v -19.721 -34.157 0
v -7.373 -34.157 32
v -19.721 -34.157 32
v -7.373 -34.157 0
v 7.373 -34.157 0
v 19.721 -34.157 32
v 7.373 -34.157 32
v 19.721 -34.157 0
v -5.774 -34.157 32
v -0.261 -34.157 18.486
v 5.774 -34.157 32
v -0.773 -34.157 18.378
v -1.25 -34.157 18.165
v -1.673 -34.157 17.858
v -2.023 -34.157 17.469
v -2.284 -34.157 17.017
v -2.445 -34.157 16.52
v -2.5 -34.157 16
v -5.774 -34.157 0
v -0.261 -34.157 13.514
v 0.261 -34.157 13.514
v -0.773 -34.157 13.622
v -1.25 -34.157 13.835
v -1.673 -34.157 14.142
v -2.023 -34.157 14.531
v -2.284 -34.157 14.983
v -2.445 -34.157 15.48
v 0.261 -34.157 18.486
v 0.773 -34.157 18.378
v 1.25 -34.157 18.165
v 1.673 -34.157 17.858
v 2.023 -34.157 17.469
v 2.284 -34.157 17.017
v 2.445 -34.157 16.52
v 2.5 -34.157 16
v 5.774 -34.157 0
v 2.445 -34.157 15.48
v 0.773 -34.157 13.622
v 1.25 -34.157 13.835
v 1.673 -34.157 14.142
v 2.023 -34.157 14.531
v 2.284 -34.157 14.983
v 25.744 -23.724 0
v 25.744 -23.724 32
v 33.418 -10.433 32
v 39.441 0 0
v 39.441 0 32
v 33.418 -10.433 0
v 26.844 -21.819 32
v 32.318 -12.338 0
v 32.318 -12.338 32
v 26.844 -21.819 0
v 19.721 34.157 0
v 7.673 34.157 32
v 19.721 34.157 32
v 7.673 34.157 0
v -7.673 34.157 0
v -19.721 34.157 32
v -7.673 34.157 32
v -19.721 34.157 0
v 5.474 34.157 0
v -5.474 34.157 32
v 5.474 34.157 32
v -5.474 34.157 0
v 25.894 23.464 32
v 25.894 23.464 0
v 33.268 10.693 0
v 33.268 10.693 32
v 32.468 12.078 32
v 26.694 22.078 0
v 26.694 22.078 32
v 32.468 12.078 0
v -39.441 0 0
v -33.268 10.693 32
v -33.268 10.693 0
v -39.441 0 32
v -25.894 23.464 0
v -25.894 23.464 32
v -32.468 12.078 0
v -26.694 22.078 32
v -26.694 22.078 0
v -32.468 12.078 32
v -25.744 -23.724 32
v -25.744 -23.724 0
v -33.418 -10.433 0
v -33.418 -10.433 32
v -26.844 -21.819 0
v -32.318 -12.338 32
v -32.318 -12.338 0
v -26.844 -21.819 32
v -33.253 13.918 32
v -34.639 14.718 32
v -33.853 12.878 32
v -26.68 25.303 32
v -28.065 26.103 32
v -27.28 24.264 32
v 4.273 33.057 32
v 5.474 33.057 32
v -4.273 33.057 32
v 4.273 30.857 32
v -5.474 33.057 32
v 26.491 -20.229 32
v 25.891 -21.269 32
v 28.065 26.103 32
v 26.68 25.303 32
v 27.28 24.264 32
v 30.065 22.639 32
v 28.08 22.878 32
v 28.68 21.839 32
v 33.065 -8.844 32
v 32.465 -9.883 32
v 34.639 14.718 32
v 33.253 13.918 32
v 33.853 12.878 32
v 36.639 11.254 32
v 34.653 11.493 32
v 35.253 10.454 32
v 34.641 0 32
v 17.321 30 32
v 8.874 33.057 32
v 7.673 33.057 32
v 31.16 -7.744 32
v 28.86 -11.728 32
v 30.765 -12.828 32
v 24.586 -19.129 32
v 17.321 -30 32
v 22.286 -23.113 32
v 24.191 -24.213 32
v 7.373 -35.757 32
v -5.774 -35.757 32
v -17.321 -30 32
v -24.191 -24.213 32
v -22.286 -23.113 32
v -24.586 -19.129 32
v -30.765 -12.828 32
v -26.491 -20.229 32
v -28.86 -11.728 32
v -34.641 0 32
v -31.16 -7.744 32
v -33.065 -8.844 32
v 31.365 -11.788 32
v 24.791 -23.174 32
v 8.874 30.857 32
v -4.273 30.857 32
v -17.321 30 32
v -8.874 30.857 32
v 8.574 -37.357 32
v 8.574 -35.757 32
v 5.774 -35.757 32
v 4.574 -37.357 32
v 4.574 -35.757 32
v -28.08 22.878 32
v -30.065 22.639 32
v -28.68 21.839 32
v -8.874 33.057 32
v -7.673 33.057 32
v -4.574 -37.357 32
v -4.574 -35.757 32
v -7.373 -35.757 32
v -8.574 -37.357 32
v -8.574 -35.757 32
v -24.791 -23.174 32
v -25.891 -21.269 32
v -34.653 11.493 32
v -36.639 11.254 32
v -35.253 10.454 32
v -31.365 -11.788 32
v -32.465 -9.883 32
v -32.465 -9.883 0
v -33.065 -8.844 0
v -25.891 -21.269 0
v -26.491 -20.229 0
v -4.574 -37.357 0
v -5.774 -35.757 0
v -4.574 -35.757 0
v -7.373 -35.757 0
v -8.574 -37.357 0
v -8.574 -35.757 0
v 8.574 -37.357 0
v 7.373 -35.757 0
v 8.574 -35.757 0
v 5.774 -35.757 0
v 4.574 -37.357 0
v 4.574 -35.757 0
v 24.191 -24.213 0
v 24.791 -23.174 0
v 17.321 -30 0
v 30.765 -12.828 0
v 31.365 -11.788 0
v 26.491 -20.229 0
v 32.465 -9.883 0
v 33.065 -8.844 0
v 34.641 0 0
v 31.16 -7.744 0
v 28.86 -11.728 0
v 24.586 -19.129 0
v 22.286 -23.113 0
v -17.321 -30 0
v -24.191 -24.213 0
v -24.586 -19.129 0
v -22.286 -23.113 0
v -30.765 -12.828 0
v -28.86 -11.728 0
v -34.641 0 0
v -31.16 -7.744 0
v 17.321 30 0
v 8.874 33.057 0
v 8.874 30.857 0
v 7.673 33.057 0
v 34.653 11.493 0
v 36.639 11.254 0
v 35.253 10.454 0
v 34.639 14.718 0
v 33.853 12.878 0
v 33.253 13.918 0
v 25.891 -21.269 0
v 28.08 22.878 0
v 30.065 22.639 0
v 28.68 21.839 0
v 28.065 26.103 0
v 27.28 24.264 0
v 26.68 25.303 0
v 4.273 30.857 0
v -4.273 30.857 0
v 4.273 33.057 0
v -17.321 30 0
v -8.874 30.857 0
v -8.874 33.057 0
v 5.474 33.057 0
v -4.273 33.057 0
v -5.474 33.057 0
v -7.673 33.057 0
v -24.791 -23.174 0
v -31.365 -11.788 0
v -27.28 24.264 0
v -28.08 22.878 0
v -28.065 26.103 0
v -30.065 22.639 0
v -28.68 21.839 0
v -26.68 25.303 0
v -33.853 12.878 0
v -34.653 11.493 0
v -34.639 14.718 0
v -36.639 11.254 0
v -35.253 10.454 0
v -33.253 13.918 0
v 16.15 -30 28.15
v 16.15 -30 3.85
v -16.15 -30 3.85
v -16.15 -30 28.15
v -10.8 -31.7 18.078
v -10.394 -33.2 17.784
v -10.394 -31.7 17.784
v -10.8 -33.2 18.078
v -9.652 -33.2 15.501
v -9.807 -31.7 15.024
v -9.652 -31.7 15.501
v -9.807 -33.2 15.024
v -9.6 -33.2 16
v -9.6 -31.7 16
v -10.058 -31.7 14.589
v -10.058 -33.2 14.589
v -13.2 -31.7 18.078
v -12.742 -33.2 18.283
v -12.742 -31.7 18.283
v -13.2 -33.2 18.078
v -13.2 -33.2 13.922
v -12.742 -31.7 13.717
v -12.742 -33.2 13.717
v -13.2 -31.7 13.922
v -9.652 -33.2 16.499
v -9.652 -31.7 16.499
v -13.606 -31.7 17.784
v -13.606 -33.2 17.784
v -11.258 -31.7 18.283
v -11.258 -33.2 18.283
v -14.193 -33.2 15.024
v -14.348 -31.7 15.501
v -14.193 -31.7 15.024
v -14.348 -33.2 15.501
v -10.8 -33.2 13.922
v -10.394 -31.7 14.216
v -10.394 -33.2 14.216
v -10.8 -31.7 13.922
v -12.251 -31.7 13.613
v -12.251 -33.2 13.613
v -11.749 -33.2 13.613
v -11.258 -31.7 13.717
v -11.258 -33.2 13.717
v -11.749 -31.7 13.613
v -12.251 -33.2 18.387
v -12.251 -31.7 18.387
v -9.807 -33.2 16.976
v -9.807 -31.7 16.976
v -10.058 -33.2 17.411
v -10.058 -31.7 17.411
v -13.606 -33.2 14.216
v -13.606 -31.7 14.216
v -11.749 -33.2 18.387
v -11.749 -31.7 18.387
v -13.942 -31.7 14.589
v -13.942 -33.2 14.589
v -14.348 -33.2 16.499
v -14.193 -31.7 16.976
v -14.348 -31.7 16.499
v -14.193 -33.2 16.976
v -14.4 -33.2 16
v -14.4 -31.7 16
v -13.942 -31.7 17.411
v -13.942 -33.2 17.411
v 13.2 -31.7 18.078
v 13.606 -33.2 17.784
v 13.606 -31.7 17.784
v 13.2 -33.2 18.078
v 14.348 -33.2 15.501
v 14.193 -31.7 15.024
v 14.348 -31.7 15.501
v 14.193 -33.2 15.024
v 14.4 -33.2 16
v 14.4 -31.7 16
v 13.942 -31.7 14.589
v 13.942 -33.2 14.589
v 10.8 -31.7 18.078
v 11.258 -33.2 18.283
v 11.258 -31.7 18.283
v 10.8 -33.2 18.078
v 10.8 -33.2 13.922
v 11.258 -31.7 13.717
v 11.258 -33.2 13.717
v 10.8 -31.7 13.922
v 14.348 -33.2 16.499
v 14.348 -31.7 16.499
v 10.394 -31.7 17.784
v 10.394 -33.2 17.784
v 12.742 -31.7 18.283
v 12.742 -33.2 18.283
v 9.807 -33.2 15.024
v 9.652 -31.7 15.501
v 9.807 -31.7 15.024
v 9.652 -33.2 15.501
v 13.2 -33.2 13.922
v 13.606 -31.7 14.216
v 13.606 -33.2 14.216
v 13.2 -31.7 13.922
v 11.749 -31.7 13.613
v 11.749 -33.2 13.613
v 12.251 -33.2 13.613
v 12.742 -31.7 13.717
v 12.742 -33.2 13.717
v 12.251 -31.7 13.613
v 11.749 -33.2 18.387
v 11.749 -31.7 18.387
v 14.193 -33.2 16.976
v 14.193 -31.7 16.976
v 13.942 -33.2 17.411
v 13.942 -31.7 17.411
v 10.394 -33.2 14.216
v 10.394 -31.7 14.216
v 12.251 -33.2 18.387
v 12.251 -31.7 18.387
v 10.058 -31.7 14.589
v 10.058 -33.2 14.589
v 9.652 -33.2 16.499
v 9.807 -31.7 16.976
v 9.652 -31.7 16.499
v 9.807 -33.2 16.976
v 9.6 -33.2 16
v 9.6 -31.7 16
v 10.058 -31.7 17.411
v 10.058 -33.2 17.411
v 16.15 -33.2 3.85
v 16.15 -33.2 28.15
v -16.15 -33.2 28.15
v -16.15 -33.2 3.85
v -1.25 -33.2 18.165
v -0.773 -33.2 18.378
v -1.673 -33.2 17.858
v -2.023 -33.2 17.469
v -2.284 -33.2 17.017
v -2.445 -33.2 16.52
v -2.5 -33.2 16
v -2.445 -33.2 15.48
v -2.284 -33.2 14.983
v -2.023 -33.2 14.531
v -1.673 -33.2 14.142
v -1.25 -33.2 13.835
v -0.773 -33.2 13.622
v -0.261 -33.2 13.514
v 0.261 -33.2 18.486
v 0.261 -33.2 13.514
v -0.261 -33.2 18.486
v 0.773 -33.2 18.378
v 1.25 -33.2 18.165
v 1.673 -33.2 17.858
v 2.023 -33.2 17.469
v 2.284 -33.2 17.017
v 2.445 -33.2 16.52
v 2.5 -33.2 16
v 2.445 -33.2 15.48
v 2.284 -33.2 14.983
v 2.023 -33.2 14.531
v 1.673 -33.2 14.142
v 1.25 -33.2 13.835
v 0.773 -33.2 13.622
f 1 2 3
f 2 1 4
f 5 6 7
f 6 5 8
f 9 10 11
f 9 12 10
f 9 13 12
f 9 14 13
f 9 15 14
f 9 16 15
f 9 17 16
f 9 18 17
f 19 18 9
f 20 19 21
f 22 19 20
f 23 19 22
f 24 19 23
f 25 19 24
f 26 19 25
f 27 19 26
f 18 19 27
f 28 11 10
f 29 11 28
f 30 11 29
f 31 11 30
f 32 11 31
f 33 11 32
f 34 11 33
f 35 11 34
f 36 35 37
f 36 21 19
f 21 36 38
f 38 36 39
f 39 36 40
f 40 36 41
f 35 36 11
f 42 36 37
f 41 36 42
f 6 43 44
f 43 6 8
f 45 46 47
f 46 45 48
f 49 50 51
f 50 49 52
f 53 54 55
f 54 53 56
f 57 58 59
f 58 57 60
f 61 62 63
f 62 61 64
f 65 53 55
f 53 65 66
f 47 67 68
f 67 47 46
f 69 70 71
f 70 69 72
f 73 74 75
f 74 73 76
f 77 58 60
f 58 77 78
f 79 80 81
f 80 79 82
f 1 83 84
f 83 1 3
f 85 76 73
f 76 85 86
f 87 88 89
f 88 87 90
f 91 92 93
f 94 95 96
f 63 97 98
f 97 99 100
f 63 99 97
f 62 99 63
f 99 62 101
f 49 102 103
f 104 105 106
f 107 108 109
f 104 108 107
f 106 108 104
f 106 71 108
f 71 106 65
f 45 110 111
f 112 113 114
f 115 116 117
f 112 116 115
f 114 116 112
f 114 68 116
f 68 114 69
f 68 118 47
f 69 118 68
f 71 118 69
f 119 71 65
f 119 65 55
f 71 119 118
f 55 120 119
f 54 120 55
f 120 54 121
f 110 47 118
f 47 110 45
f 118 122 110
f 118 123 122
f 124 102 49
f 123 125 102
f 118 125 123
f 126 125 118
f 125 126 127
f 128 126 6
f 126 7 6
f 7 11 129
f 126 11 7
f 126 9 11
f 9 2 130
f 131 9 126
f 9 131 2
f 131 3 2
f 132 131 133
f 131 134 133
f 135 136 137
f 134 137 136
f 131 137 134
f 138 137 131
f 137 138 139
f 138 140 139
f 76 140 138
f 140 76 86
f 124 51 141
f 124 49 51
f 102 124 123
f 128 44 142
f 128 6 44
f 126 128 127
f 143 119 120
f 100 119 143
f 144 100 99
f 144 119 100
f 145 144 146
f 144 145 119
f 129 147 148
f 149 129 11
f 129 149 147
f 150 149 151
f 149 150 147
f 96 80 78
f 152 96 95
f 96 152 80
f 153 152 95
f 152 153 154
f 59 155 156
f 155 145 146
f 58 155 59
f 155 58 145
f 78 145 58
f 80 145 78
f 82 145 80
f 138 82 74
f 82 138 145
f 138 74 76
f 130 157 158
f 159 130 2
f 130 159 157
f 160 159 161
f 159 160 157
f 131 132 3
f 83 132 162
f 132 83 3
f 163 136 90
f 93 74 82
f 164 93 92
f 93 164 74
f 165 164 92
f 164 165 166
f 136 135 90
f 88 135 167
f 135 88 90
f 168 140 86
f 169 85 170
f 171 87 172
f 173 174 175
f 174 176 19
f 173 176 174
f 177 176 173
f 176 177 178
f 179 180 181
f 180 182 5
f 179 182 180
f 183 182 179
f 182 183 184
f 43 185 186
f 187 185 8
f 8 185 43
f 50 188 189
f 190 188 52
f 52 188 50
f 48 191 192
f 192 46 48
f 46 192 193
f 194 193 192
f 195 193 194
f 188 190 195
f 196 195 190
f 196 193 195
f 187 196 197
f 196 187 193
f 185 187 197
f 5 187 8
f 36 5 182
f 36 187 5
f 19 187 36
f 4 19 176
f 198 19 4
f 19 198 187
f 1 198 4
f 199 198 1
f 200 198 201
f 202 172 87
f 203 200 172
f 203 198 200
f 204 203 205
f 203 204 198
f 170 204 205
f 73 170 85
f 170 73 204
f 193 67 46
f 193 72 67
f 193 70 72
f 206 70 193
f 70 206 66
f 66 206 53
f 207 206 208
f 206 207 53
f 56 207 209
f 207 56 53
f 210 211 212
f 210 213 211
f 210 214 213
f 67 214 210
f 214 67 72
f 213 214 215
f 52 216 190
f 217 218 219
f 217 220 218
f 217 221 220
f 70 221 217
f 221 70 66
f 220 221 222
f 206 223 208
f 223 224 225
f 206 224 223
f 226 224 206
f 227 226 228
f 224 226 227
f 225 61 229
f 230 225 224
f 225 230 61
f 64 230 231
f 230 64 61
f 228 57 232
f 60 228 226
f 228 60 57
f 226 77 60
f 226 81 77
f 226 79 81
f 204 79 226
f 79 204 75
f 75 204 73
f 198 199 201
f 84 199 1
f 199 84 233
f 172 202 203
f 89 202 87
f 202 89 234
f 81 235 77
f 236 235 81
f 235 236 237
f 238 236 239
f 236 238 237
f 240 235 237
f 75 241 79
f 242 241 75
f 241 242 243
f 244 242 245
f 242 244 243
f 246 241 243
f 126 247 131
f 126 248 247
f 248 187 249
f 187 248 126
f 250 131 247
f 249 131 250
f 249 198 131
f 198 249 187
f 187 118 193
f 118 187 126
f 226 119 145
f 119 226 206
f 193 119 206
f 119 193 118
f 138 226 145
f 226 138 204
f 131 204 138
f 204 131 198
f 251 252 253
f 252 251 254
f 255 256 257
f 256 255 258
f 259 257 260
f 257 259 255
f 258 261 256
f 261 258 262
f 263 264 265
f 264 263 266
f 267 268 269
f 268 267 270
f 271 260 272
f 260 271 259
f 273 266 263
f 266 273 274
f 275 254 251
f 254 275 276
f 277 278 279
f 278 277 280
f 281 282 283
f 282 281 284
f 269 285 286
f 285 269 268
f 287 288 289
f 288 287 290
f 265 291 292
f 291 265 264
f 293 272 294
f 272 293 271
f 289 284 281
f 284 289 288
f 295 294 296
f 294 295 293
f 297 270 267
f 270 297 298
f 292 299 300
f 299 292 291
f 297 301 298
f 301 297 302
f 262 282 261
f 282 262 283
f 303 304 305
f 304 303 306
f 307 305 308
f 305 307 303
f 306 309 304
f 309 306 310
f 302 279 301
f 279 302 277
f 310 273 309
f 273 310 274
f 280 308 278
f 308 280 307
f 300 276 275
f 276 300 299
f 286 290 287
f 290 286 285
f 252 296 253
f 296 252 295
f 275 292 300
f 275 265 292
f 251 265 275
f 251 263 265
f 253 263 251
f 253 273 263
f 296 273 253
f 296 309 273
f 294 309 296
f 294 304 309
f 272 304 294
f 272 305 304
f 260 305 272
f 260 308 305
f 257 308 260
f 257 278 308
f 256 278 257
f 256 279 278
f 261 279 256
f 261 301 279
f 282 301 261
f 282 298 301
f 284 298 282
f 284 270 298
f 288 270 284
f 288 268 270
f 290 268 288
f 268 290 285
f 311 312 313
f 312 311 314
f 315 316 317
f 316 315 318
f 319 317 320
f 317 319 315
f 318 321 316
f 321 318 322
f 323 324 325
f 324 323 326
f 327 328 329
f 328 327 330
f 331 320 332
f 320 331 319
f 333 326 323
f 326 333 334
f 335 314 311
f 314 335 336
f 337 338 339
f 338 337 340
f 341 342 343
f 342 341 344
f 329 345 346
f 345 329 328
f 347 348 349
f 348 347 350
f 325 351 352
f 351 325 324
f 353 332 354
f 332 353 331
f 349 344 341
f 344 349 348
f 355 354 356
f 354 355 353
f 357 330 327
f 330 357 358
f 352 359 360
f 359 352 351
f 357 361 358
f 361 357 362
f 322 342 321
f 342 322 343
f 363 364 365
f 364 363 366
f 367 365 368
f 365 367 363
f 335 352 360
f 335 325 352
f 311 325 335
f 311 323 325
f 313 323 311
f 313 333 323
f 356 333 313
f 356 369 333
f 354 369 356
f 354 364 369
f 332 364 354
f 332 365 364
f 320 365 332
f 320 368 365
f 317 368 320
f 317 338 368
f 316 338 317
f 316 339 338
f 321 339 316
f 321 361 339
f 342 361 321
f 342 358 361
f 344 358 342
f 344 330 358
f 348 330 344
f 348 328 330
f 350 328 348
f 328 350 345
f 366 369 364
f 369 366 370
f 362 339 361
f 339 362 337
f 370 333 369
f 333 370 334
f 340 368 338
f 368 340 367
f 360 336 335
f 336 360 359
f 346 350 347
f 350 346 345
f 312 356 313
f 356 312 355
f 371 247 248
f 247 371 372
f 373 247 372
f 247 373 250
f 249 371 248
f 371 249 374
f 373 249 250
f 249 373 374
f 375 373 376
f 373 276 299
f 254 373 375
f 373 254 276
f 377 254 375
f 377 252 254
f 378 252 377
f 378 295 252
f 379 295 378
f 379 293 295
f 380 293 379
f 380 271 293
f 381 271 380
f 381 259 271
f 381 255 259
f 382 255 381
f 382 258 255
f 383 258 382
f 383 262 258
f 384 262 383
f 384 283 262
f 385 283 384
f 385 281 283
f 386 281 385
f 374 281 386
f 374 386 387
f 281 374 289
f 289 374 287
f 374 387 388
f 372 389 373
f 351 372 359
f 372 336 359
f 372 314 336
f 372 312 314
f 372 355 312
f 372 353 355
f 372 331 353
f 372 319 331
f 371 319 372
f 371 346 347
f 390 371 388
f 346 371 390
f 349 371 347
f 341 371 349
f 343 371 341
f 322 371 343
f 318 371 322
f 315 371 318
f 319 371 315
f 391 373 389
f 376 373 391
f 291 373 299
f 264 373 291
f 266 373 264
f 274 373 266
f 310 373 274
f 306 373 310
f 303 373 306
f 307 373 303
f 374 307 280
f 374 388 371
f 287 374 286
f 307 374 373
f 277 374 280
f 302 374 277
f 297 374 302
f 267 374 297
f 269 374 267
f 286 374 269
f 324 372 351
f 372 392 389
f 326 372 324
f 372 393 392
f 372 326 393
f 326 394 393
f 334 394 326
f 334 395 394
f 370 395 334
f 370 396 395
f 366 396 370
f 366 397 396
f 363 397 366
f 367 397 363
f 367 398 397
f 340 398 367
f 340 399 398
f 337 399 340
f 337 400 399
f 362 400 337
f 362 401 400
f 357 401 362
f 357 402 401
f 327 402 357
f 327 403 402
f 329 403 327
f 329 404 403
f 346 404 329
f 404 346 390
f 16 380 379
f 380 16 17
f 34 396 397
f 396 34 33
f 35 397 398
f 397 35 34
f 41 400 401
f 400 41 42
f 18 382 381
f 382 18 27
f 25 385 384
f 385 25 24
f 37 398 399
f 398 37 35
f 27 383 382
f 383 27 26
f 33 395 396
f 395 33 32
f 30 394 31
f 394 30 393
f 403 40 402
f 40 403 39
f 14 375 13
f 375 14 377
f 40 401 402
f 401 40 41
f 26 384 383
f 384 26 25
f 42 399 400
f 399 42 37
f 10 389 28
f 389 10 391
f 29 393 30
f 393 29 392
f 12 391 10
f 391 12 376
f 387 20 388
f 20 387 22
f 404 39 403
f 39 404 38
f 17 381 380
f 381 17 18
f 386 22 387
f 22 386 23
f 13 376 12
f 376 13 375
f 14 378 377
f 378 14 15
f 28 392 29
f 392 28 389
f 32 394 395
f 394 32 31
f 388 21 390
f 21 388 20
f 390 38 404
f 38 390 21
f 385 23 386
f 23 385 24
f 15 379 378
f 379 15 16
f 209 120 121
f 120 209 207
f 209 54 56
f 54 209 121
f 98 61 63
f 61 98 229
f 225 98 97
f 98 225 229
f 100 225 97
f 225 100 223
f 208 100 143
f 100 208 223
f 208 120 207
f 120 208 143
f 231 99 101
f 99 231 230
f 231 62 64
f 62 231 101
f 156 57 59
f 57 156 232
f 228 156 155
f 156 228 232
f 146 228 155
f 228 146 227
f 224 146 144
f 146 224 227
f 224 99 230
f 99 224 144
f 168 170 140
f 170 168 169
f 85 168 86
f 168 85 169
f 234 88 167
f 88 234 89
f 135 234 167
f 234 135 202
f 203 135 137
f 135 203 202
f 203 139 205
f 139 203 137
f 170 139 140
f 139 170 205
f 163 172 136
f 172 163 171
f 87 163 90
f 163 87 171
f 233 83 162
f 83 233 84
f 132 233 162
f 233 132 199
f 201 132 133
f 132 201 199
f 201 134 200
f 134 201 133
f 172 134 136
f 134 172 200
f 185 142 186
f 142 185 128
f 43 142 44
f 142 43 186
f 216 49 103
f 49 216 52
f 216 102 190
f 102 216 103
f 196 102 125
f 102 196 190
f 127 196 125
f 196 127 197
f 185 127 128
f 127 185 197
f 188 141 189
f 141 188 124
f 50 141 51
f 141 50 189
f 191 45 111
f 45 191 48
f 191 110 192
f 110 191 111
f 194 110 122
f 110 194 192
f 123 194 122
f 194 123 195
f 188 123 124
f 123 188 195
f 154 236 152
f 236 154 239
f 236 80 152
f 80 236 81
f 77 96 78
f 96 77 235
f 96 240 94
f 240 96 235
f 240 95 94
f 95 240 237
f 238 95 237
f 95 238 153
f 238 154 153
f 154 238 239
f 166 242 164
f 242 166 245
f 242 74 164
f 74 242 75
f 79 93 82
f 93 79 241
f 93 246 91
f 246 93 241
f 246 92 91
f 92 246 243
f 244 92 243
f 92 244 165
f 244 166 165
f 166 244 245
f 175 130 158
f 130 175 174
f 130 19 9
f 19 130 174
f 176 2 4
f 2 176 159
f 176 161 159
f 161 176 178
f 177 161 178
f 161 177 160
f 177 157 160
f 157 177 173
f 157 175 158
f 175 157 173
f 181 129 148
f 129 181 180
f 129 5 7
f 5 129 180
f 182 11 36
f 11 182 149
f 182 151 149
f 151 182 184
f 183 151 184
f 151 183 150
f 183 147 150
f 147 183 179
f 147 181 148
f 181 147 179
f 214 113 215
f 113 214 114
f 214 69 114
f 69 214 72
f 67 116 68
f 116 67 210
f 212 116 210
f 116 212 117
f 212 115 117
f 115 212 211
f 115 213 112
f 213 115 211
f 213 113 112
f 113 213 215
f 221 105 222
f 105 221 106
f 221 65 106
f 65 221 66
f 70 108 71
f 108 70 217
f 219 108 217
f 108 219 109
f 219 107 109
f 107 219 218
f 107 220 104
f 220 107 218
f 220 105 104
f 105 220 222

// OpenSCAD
/* [Size and Shape] */

// Height needed on the inside of the hexagon (mm)
total_interior_height = 60; // [50:200]

// Depth of the hexagon, front to back (mm)
hexagon_depth = 32; // [16:50]

// Recessed LEGO base?
LEGO_base = 1; // [1:Yes,0:No]

// LEGO recess location
LEGO_base_location = 0; // [1:Near Front,0:Center,-1:Near Back]

// Hole for pushing LEGO baseplate out (only with baseplate)?
baseplate_hole = 1; // [1:Yes,0:No]

// Back Type
back_type = 0; // [0:None,1:Full Back]

// Mount Type (only with full back)
mount_type = 1; // [0:None,1:Keyhole Mount]

/* [Rails and Slots] */

// Connector type - top
top_connector = -1; // [-1:Slot,0:None,1:Rail]
// Connector type - top right
top_right_connector = 1; // [-1:Slot,0:None,1:Rail]
// Connector type - bottom right
bottom_right_connector = -1; // [-1:Slot,0:None,1:Rail]
// Connector type - bottom
bottom_connector = 1; // [-1:Slot,0:None,1:Rail]
// Connector type - bottom left
bottom_left_connector = -1; // [-1:Slot,0:None,1:Rail]
// Connector type - top left
top_left_connector = 1; // [-1:Slot,0:None,1:Rail]

// Slot Gap (mm) (0.15 is super tight, 0.3 is recommended)
slot_gap = 0.3; // [0.15:0.5]

/* [Hidden] */

$fn = 30;
legoUnit = 1.6*5;
plateH = 3.2;

totH = total_interior_height;

baseD = hexagon_depth; //4*legoUnit;
t = plateH+1.6;

baseW = totH/cos(30)/2+t;
echo(baseW);
echo(2*(baseW-t)*cos(30));

module hex(h,d) {
    cylinder(h,d1=d,d2=d,$fn=6);
}

module cell() {
    difference() {
        hex(baseD,baseW*2);
        translate([0,0,-1]) hex(baseD+2,baseW*2-2*t);
    }
}

module keyhole() {
    h1 = 5;
    h2 = 9;
    hlen = 10;
    translate([0,0,-1]) hull() {
        cylinder(totH,d1=h1,d2=h1);
        translate([0,hlen,0]) cylinder(totH,d1=h1,d2=h1);
    }
    translate([0,0,-1]) cylinder(totH,d1=h2,d2=h2);
}
    
module partial_back(tt) {
    difference() {
        hex(tt,baseW*2-2*t);
        translate([-baseD-10,-2*baseD-13,-1]) cube([2*baseD+20,2*baseD+20,baseD+2]);
        keyhole();

    }
}

module fullBack(tt) {
    hex(tt,baseW*2-2*t);
}

module slider_old() {
    linear_extrude(baseD*1) {
        translate([-0.8,0,0]) square([1.6,1.6+1.6]);
        translate([-2,1.6,0]) square([4,1.6]);
    }
}

module slider() {
    linear_extrude(baseD*1) {
        translate([-0.8,-0.5,0]) square([1.6,1.6+1.6+0.5]);
        translate([-2,1.6,0]) square([4,1.6]);
    }
}


module slot() {
    // delta of 0.15 = original
    // delta of 0.3 = loose fit
    translate([0,0.2,-1]) linear_extrude(baseD+2) offset(delta=slot_gap) rotate([0,0,180]) {
        translate([-0.8,0,0]) square([1.6,1.6+1.6]);
        translate([-2,1.6,0]) square([4,1.6]);
    }
}

module stud() {
    cylinder(1.6,d1=4.8,d2=4.8,$fn=30);
}

module stud3x4() {
    translate([-legoUnit*1.5,-legoUnit*1,0]) {
        for (i=[0,3]) {
            for (j=[1:1]) {
                translate([i*legoUnit,j*legoUnit,0]) stud();
            }
        }
    }
}


cutoutW = 4*legoUnit+0.3;
cutoutD = 3*legoUnit+0.3;
cutoutH = plateH;

module plateCutout() {
    difference() {
        translate([-cutoutW/2,0,0]) cube([cutoutW,cutoutH+10,cutoutD]);
        // Studs
        if (LEGO_base == 1) translate([0,-0.1,cutoutD/2]) rotate([-90,0,0]) stud3x4();
    }
    // hole for pushing plate out
    if (baseplate_hole == 1) if (LEGO_base == 1) translate([0,5,cutoutD/2]) rotate([90,0,0]) cylinder(20,d1=5,d2=5,$fn=30);
}        

module display() {

    difference() {
        cell();
        
        // cutout for base
        if (LEGO_base == 1) translate([0,-totH/2-plateH,LEGO_base_location*(baseD/2-cutoutD/2-legoUnit/3)+baseD/2-cutoutD/2]) plateCutout();

 
        // slots
        if (top_connector == -1) {
            rotate([0,0,60*0]) {
                translate([baseW/6,baseW*cos(30),-0.15]) slot();
                translate([-baseW/6,baseW*cos(30),-0.15]) slot();
            }
        }
        if (top_right_connector == -1) {
            rotate([0,0,60*1]) {
                translate([baseW/6,baseW*cos(30),-0.15]) slot();
                translate([-baseW/6,baseW*cos(30),-0.15]) slot();
            }
        }
        if (bottom_right_connector == -1) {
            rotate([0,0,60*2]) {
                translate([baseW/6,baseW*cos(30),-0.15]) slot();
                translate([-baseW/6,baseW*cos(30),-0.15]) slot();
            }
        }
        if (bottom_connector == -1) {
            rotate([0,0,60*3]) {
                translate([baseW/6,baseW*cos(30),-0.15]) slot();
                translate([-baseW/6,baseW*cos(30),-0.15]) slot();
            }
        }
        if (bottom_left_connector == -1) {
            rotate([0,0,60*4]) {
                translate([baseW/6,baseW*cos(30),-0.15]) slot();
                translate([-baseW/6,baseW*cos(30),-0.15]) slot();
            }
        }
        if (top_left_connector == -1) {
            rotate([0,0,60*5]) {
                translate([baseW/6,baseW*cos(30),-0.15]) slot();
                translate([-baseW/6,baseW*cos(30),-0.15]) slot();
            }
        }
    }

  
    // rails
    if (top_connector == 1) {
        rotate([0,0,60*0]) {
            translate([baseW/6,baseW*cos(30),0]) slider();
            translate([-baseW/6,baseW*cos(30),0]) slider();
        }
    }
    if (top_right_connector == 1) {
        rotate([0,0,60*1]) {
            translate([baseW/6,baseW*cos(30),0]) slider();
            translate([-baseW/6,baseW*cos(30),0]) slider();
        }
    }
    if (bottom_right_connector == 1) {
        rotate([0,0,60*2]) {
            translate([baseW/6,baseW*cos(30),0]) slider();
            translate([-baseW/6,baseW*cos(30),0]) slider();
        }
    }
    if (bottom_connector == 1) {
        rotate([0,0,60*3]) {
            translate([baseW/6,baseW*cos(30),0]) slider();
            translate([-baseW/6,baseW*cos(30),0]) slider();
        }
    }
    if (bottom_left_connector == 1) {
        rotate([0,0,60*4]) {
            translate([baseW/6,baseW*cos(30),0]) slider();
            translate([-baseW/6,baseW*cos(30),0]) slider();
        }
    }
    if (top_left_connector == 1) {
        rotate([0,0,60*5]) {
            translate([baseW/6,baseW*cos(30),0]) slider();
            translate([-baseW/6,baseW*cos(30),0]) slider();
        }
    }
    
    // full back
    if (back_type == 1) difference() {
        fullBack(2);
        // keyhole mount
        if (mount_type == 1) translate([0,totH*0.4-10,-1]) keyhole();
    }
    
}

/*
difference() {
    display();
    translate([-100,-100,baseD/2]) cube([200,200,100]);
}
*/

/*
difference() {
    display();
    //translate([25,0,0]) rotate([0,0,60]) translate([-100,0,-1]) cube([200,100,100]);
    #translate([-100,0,-1]) cube([200,100,100]);
    #rotate([0,0,60]) translate([-100,0,-1]) cube([200,100,100]);
    #rotate([0,0,-60]) translate([-100,0,-1]) cube([200,100,100]);
}
*/

display();

//plateCutout();
